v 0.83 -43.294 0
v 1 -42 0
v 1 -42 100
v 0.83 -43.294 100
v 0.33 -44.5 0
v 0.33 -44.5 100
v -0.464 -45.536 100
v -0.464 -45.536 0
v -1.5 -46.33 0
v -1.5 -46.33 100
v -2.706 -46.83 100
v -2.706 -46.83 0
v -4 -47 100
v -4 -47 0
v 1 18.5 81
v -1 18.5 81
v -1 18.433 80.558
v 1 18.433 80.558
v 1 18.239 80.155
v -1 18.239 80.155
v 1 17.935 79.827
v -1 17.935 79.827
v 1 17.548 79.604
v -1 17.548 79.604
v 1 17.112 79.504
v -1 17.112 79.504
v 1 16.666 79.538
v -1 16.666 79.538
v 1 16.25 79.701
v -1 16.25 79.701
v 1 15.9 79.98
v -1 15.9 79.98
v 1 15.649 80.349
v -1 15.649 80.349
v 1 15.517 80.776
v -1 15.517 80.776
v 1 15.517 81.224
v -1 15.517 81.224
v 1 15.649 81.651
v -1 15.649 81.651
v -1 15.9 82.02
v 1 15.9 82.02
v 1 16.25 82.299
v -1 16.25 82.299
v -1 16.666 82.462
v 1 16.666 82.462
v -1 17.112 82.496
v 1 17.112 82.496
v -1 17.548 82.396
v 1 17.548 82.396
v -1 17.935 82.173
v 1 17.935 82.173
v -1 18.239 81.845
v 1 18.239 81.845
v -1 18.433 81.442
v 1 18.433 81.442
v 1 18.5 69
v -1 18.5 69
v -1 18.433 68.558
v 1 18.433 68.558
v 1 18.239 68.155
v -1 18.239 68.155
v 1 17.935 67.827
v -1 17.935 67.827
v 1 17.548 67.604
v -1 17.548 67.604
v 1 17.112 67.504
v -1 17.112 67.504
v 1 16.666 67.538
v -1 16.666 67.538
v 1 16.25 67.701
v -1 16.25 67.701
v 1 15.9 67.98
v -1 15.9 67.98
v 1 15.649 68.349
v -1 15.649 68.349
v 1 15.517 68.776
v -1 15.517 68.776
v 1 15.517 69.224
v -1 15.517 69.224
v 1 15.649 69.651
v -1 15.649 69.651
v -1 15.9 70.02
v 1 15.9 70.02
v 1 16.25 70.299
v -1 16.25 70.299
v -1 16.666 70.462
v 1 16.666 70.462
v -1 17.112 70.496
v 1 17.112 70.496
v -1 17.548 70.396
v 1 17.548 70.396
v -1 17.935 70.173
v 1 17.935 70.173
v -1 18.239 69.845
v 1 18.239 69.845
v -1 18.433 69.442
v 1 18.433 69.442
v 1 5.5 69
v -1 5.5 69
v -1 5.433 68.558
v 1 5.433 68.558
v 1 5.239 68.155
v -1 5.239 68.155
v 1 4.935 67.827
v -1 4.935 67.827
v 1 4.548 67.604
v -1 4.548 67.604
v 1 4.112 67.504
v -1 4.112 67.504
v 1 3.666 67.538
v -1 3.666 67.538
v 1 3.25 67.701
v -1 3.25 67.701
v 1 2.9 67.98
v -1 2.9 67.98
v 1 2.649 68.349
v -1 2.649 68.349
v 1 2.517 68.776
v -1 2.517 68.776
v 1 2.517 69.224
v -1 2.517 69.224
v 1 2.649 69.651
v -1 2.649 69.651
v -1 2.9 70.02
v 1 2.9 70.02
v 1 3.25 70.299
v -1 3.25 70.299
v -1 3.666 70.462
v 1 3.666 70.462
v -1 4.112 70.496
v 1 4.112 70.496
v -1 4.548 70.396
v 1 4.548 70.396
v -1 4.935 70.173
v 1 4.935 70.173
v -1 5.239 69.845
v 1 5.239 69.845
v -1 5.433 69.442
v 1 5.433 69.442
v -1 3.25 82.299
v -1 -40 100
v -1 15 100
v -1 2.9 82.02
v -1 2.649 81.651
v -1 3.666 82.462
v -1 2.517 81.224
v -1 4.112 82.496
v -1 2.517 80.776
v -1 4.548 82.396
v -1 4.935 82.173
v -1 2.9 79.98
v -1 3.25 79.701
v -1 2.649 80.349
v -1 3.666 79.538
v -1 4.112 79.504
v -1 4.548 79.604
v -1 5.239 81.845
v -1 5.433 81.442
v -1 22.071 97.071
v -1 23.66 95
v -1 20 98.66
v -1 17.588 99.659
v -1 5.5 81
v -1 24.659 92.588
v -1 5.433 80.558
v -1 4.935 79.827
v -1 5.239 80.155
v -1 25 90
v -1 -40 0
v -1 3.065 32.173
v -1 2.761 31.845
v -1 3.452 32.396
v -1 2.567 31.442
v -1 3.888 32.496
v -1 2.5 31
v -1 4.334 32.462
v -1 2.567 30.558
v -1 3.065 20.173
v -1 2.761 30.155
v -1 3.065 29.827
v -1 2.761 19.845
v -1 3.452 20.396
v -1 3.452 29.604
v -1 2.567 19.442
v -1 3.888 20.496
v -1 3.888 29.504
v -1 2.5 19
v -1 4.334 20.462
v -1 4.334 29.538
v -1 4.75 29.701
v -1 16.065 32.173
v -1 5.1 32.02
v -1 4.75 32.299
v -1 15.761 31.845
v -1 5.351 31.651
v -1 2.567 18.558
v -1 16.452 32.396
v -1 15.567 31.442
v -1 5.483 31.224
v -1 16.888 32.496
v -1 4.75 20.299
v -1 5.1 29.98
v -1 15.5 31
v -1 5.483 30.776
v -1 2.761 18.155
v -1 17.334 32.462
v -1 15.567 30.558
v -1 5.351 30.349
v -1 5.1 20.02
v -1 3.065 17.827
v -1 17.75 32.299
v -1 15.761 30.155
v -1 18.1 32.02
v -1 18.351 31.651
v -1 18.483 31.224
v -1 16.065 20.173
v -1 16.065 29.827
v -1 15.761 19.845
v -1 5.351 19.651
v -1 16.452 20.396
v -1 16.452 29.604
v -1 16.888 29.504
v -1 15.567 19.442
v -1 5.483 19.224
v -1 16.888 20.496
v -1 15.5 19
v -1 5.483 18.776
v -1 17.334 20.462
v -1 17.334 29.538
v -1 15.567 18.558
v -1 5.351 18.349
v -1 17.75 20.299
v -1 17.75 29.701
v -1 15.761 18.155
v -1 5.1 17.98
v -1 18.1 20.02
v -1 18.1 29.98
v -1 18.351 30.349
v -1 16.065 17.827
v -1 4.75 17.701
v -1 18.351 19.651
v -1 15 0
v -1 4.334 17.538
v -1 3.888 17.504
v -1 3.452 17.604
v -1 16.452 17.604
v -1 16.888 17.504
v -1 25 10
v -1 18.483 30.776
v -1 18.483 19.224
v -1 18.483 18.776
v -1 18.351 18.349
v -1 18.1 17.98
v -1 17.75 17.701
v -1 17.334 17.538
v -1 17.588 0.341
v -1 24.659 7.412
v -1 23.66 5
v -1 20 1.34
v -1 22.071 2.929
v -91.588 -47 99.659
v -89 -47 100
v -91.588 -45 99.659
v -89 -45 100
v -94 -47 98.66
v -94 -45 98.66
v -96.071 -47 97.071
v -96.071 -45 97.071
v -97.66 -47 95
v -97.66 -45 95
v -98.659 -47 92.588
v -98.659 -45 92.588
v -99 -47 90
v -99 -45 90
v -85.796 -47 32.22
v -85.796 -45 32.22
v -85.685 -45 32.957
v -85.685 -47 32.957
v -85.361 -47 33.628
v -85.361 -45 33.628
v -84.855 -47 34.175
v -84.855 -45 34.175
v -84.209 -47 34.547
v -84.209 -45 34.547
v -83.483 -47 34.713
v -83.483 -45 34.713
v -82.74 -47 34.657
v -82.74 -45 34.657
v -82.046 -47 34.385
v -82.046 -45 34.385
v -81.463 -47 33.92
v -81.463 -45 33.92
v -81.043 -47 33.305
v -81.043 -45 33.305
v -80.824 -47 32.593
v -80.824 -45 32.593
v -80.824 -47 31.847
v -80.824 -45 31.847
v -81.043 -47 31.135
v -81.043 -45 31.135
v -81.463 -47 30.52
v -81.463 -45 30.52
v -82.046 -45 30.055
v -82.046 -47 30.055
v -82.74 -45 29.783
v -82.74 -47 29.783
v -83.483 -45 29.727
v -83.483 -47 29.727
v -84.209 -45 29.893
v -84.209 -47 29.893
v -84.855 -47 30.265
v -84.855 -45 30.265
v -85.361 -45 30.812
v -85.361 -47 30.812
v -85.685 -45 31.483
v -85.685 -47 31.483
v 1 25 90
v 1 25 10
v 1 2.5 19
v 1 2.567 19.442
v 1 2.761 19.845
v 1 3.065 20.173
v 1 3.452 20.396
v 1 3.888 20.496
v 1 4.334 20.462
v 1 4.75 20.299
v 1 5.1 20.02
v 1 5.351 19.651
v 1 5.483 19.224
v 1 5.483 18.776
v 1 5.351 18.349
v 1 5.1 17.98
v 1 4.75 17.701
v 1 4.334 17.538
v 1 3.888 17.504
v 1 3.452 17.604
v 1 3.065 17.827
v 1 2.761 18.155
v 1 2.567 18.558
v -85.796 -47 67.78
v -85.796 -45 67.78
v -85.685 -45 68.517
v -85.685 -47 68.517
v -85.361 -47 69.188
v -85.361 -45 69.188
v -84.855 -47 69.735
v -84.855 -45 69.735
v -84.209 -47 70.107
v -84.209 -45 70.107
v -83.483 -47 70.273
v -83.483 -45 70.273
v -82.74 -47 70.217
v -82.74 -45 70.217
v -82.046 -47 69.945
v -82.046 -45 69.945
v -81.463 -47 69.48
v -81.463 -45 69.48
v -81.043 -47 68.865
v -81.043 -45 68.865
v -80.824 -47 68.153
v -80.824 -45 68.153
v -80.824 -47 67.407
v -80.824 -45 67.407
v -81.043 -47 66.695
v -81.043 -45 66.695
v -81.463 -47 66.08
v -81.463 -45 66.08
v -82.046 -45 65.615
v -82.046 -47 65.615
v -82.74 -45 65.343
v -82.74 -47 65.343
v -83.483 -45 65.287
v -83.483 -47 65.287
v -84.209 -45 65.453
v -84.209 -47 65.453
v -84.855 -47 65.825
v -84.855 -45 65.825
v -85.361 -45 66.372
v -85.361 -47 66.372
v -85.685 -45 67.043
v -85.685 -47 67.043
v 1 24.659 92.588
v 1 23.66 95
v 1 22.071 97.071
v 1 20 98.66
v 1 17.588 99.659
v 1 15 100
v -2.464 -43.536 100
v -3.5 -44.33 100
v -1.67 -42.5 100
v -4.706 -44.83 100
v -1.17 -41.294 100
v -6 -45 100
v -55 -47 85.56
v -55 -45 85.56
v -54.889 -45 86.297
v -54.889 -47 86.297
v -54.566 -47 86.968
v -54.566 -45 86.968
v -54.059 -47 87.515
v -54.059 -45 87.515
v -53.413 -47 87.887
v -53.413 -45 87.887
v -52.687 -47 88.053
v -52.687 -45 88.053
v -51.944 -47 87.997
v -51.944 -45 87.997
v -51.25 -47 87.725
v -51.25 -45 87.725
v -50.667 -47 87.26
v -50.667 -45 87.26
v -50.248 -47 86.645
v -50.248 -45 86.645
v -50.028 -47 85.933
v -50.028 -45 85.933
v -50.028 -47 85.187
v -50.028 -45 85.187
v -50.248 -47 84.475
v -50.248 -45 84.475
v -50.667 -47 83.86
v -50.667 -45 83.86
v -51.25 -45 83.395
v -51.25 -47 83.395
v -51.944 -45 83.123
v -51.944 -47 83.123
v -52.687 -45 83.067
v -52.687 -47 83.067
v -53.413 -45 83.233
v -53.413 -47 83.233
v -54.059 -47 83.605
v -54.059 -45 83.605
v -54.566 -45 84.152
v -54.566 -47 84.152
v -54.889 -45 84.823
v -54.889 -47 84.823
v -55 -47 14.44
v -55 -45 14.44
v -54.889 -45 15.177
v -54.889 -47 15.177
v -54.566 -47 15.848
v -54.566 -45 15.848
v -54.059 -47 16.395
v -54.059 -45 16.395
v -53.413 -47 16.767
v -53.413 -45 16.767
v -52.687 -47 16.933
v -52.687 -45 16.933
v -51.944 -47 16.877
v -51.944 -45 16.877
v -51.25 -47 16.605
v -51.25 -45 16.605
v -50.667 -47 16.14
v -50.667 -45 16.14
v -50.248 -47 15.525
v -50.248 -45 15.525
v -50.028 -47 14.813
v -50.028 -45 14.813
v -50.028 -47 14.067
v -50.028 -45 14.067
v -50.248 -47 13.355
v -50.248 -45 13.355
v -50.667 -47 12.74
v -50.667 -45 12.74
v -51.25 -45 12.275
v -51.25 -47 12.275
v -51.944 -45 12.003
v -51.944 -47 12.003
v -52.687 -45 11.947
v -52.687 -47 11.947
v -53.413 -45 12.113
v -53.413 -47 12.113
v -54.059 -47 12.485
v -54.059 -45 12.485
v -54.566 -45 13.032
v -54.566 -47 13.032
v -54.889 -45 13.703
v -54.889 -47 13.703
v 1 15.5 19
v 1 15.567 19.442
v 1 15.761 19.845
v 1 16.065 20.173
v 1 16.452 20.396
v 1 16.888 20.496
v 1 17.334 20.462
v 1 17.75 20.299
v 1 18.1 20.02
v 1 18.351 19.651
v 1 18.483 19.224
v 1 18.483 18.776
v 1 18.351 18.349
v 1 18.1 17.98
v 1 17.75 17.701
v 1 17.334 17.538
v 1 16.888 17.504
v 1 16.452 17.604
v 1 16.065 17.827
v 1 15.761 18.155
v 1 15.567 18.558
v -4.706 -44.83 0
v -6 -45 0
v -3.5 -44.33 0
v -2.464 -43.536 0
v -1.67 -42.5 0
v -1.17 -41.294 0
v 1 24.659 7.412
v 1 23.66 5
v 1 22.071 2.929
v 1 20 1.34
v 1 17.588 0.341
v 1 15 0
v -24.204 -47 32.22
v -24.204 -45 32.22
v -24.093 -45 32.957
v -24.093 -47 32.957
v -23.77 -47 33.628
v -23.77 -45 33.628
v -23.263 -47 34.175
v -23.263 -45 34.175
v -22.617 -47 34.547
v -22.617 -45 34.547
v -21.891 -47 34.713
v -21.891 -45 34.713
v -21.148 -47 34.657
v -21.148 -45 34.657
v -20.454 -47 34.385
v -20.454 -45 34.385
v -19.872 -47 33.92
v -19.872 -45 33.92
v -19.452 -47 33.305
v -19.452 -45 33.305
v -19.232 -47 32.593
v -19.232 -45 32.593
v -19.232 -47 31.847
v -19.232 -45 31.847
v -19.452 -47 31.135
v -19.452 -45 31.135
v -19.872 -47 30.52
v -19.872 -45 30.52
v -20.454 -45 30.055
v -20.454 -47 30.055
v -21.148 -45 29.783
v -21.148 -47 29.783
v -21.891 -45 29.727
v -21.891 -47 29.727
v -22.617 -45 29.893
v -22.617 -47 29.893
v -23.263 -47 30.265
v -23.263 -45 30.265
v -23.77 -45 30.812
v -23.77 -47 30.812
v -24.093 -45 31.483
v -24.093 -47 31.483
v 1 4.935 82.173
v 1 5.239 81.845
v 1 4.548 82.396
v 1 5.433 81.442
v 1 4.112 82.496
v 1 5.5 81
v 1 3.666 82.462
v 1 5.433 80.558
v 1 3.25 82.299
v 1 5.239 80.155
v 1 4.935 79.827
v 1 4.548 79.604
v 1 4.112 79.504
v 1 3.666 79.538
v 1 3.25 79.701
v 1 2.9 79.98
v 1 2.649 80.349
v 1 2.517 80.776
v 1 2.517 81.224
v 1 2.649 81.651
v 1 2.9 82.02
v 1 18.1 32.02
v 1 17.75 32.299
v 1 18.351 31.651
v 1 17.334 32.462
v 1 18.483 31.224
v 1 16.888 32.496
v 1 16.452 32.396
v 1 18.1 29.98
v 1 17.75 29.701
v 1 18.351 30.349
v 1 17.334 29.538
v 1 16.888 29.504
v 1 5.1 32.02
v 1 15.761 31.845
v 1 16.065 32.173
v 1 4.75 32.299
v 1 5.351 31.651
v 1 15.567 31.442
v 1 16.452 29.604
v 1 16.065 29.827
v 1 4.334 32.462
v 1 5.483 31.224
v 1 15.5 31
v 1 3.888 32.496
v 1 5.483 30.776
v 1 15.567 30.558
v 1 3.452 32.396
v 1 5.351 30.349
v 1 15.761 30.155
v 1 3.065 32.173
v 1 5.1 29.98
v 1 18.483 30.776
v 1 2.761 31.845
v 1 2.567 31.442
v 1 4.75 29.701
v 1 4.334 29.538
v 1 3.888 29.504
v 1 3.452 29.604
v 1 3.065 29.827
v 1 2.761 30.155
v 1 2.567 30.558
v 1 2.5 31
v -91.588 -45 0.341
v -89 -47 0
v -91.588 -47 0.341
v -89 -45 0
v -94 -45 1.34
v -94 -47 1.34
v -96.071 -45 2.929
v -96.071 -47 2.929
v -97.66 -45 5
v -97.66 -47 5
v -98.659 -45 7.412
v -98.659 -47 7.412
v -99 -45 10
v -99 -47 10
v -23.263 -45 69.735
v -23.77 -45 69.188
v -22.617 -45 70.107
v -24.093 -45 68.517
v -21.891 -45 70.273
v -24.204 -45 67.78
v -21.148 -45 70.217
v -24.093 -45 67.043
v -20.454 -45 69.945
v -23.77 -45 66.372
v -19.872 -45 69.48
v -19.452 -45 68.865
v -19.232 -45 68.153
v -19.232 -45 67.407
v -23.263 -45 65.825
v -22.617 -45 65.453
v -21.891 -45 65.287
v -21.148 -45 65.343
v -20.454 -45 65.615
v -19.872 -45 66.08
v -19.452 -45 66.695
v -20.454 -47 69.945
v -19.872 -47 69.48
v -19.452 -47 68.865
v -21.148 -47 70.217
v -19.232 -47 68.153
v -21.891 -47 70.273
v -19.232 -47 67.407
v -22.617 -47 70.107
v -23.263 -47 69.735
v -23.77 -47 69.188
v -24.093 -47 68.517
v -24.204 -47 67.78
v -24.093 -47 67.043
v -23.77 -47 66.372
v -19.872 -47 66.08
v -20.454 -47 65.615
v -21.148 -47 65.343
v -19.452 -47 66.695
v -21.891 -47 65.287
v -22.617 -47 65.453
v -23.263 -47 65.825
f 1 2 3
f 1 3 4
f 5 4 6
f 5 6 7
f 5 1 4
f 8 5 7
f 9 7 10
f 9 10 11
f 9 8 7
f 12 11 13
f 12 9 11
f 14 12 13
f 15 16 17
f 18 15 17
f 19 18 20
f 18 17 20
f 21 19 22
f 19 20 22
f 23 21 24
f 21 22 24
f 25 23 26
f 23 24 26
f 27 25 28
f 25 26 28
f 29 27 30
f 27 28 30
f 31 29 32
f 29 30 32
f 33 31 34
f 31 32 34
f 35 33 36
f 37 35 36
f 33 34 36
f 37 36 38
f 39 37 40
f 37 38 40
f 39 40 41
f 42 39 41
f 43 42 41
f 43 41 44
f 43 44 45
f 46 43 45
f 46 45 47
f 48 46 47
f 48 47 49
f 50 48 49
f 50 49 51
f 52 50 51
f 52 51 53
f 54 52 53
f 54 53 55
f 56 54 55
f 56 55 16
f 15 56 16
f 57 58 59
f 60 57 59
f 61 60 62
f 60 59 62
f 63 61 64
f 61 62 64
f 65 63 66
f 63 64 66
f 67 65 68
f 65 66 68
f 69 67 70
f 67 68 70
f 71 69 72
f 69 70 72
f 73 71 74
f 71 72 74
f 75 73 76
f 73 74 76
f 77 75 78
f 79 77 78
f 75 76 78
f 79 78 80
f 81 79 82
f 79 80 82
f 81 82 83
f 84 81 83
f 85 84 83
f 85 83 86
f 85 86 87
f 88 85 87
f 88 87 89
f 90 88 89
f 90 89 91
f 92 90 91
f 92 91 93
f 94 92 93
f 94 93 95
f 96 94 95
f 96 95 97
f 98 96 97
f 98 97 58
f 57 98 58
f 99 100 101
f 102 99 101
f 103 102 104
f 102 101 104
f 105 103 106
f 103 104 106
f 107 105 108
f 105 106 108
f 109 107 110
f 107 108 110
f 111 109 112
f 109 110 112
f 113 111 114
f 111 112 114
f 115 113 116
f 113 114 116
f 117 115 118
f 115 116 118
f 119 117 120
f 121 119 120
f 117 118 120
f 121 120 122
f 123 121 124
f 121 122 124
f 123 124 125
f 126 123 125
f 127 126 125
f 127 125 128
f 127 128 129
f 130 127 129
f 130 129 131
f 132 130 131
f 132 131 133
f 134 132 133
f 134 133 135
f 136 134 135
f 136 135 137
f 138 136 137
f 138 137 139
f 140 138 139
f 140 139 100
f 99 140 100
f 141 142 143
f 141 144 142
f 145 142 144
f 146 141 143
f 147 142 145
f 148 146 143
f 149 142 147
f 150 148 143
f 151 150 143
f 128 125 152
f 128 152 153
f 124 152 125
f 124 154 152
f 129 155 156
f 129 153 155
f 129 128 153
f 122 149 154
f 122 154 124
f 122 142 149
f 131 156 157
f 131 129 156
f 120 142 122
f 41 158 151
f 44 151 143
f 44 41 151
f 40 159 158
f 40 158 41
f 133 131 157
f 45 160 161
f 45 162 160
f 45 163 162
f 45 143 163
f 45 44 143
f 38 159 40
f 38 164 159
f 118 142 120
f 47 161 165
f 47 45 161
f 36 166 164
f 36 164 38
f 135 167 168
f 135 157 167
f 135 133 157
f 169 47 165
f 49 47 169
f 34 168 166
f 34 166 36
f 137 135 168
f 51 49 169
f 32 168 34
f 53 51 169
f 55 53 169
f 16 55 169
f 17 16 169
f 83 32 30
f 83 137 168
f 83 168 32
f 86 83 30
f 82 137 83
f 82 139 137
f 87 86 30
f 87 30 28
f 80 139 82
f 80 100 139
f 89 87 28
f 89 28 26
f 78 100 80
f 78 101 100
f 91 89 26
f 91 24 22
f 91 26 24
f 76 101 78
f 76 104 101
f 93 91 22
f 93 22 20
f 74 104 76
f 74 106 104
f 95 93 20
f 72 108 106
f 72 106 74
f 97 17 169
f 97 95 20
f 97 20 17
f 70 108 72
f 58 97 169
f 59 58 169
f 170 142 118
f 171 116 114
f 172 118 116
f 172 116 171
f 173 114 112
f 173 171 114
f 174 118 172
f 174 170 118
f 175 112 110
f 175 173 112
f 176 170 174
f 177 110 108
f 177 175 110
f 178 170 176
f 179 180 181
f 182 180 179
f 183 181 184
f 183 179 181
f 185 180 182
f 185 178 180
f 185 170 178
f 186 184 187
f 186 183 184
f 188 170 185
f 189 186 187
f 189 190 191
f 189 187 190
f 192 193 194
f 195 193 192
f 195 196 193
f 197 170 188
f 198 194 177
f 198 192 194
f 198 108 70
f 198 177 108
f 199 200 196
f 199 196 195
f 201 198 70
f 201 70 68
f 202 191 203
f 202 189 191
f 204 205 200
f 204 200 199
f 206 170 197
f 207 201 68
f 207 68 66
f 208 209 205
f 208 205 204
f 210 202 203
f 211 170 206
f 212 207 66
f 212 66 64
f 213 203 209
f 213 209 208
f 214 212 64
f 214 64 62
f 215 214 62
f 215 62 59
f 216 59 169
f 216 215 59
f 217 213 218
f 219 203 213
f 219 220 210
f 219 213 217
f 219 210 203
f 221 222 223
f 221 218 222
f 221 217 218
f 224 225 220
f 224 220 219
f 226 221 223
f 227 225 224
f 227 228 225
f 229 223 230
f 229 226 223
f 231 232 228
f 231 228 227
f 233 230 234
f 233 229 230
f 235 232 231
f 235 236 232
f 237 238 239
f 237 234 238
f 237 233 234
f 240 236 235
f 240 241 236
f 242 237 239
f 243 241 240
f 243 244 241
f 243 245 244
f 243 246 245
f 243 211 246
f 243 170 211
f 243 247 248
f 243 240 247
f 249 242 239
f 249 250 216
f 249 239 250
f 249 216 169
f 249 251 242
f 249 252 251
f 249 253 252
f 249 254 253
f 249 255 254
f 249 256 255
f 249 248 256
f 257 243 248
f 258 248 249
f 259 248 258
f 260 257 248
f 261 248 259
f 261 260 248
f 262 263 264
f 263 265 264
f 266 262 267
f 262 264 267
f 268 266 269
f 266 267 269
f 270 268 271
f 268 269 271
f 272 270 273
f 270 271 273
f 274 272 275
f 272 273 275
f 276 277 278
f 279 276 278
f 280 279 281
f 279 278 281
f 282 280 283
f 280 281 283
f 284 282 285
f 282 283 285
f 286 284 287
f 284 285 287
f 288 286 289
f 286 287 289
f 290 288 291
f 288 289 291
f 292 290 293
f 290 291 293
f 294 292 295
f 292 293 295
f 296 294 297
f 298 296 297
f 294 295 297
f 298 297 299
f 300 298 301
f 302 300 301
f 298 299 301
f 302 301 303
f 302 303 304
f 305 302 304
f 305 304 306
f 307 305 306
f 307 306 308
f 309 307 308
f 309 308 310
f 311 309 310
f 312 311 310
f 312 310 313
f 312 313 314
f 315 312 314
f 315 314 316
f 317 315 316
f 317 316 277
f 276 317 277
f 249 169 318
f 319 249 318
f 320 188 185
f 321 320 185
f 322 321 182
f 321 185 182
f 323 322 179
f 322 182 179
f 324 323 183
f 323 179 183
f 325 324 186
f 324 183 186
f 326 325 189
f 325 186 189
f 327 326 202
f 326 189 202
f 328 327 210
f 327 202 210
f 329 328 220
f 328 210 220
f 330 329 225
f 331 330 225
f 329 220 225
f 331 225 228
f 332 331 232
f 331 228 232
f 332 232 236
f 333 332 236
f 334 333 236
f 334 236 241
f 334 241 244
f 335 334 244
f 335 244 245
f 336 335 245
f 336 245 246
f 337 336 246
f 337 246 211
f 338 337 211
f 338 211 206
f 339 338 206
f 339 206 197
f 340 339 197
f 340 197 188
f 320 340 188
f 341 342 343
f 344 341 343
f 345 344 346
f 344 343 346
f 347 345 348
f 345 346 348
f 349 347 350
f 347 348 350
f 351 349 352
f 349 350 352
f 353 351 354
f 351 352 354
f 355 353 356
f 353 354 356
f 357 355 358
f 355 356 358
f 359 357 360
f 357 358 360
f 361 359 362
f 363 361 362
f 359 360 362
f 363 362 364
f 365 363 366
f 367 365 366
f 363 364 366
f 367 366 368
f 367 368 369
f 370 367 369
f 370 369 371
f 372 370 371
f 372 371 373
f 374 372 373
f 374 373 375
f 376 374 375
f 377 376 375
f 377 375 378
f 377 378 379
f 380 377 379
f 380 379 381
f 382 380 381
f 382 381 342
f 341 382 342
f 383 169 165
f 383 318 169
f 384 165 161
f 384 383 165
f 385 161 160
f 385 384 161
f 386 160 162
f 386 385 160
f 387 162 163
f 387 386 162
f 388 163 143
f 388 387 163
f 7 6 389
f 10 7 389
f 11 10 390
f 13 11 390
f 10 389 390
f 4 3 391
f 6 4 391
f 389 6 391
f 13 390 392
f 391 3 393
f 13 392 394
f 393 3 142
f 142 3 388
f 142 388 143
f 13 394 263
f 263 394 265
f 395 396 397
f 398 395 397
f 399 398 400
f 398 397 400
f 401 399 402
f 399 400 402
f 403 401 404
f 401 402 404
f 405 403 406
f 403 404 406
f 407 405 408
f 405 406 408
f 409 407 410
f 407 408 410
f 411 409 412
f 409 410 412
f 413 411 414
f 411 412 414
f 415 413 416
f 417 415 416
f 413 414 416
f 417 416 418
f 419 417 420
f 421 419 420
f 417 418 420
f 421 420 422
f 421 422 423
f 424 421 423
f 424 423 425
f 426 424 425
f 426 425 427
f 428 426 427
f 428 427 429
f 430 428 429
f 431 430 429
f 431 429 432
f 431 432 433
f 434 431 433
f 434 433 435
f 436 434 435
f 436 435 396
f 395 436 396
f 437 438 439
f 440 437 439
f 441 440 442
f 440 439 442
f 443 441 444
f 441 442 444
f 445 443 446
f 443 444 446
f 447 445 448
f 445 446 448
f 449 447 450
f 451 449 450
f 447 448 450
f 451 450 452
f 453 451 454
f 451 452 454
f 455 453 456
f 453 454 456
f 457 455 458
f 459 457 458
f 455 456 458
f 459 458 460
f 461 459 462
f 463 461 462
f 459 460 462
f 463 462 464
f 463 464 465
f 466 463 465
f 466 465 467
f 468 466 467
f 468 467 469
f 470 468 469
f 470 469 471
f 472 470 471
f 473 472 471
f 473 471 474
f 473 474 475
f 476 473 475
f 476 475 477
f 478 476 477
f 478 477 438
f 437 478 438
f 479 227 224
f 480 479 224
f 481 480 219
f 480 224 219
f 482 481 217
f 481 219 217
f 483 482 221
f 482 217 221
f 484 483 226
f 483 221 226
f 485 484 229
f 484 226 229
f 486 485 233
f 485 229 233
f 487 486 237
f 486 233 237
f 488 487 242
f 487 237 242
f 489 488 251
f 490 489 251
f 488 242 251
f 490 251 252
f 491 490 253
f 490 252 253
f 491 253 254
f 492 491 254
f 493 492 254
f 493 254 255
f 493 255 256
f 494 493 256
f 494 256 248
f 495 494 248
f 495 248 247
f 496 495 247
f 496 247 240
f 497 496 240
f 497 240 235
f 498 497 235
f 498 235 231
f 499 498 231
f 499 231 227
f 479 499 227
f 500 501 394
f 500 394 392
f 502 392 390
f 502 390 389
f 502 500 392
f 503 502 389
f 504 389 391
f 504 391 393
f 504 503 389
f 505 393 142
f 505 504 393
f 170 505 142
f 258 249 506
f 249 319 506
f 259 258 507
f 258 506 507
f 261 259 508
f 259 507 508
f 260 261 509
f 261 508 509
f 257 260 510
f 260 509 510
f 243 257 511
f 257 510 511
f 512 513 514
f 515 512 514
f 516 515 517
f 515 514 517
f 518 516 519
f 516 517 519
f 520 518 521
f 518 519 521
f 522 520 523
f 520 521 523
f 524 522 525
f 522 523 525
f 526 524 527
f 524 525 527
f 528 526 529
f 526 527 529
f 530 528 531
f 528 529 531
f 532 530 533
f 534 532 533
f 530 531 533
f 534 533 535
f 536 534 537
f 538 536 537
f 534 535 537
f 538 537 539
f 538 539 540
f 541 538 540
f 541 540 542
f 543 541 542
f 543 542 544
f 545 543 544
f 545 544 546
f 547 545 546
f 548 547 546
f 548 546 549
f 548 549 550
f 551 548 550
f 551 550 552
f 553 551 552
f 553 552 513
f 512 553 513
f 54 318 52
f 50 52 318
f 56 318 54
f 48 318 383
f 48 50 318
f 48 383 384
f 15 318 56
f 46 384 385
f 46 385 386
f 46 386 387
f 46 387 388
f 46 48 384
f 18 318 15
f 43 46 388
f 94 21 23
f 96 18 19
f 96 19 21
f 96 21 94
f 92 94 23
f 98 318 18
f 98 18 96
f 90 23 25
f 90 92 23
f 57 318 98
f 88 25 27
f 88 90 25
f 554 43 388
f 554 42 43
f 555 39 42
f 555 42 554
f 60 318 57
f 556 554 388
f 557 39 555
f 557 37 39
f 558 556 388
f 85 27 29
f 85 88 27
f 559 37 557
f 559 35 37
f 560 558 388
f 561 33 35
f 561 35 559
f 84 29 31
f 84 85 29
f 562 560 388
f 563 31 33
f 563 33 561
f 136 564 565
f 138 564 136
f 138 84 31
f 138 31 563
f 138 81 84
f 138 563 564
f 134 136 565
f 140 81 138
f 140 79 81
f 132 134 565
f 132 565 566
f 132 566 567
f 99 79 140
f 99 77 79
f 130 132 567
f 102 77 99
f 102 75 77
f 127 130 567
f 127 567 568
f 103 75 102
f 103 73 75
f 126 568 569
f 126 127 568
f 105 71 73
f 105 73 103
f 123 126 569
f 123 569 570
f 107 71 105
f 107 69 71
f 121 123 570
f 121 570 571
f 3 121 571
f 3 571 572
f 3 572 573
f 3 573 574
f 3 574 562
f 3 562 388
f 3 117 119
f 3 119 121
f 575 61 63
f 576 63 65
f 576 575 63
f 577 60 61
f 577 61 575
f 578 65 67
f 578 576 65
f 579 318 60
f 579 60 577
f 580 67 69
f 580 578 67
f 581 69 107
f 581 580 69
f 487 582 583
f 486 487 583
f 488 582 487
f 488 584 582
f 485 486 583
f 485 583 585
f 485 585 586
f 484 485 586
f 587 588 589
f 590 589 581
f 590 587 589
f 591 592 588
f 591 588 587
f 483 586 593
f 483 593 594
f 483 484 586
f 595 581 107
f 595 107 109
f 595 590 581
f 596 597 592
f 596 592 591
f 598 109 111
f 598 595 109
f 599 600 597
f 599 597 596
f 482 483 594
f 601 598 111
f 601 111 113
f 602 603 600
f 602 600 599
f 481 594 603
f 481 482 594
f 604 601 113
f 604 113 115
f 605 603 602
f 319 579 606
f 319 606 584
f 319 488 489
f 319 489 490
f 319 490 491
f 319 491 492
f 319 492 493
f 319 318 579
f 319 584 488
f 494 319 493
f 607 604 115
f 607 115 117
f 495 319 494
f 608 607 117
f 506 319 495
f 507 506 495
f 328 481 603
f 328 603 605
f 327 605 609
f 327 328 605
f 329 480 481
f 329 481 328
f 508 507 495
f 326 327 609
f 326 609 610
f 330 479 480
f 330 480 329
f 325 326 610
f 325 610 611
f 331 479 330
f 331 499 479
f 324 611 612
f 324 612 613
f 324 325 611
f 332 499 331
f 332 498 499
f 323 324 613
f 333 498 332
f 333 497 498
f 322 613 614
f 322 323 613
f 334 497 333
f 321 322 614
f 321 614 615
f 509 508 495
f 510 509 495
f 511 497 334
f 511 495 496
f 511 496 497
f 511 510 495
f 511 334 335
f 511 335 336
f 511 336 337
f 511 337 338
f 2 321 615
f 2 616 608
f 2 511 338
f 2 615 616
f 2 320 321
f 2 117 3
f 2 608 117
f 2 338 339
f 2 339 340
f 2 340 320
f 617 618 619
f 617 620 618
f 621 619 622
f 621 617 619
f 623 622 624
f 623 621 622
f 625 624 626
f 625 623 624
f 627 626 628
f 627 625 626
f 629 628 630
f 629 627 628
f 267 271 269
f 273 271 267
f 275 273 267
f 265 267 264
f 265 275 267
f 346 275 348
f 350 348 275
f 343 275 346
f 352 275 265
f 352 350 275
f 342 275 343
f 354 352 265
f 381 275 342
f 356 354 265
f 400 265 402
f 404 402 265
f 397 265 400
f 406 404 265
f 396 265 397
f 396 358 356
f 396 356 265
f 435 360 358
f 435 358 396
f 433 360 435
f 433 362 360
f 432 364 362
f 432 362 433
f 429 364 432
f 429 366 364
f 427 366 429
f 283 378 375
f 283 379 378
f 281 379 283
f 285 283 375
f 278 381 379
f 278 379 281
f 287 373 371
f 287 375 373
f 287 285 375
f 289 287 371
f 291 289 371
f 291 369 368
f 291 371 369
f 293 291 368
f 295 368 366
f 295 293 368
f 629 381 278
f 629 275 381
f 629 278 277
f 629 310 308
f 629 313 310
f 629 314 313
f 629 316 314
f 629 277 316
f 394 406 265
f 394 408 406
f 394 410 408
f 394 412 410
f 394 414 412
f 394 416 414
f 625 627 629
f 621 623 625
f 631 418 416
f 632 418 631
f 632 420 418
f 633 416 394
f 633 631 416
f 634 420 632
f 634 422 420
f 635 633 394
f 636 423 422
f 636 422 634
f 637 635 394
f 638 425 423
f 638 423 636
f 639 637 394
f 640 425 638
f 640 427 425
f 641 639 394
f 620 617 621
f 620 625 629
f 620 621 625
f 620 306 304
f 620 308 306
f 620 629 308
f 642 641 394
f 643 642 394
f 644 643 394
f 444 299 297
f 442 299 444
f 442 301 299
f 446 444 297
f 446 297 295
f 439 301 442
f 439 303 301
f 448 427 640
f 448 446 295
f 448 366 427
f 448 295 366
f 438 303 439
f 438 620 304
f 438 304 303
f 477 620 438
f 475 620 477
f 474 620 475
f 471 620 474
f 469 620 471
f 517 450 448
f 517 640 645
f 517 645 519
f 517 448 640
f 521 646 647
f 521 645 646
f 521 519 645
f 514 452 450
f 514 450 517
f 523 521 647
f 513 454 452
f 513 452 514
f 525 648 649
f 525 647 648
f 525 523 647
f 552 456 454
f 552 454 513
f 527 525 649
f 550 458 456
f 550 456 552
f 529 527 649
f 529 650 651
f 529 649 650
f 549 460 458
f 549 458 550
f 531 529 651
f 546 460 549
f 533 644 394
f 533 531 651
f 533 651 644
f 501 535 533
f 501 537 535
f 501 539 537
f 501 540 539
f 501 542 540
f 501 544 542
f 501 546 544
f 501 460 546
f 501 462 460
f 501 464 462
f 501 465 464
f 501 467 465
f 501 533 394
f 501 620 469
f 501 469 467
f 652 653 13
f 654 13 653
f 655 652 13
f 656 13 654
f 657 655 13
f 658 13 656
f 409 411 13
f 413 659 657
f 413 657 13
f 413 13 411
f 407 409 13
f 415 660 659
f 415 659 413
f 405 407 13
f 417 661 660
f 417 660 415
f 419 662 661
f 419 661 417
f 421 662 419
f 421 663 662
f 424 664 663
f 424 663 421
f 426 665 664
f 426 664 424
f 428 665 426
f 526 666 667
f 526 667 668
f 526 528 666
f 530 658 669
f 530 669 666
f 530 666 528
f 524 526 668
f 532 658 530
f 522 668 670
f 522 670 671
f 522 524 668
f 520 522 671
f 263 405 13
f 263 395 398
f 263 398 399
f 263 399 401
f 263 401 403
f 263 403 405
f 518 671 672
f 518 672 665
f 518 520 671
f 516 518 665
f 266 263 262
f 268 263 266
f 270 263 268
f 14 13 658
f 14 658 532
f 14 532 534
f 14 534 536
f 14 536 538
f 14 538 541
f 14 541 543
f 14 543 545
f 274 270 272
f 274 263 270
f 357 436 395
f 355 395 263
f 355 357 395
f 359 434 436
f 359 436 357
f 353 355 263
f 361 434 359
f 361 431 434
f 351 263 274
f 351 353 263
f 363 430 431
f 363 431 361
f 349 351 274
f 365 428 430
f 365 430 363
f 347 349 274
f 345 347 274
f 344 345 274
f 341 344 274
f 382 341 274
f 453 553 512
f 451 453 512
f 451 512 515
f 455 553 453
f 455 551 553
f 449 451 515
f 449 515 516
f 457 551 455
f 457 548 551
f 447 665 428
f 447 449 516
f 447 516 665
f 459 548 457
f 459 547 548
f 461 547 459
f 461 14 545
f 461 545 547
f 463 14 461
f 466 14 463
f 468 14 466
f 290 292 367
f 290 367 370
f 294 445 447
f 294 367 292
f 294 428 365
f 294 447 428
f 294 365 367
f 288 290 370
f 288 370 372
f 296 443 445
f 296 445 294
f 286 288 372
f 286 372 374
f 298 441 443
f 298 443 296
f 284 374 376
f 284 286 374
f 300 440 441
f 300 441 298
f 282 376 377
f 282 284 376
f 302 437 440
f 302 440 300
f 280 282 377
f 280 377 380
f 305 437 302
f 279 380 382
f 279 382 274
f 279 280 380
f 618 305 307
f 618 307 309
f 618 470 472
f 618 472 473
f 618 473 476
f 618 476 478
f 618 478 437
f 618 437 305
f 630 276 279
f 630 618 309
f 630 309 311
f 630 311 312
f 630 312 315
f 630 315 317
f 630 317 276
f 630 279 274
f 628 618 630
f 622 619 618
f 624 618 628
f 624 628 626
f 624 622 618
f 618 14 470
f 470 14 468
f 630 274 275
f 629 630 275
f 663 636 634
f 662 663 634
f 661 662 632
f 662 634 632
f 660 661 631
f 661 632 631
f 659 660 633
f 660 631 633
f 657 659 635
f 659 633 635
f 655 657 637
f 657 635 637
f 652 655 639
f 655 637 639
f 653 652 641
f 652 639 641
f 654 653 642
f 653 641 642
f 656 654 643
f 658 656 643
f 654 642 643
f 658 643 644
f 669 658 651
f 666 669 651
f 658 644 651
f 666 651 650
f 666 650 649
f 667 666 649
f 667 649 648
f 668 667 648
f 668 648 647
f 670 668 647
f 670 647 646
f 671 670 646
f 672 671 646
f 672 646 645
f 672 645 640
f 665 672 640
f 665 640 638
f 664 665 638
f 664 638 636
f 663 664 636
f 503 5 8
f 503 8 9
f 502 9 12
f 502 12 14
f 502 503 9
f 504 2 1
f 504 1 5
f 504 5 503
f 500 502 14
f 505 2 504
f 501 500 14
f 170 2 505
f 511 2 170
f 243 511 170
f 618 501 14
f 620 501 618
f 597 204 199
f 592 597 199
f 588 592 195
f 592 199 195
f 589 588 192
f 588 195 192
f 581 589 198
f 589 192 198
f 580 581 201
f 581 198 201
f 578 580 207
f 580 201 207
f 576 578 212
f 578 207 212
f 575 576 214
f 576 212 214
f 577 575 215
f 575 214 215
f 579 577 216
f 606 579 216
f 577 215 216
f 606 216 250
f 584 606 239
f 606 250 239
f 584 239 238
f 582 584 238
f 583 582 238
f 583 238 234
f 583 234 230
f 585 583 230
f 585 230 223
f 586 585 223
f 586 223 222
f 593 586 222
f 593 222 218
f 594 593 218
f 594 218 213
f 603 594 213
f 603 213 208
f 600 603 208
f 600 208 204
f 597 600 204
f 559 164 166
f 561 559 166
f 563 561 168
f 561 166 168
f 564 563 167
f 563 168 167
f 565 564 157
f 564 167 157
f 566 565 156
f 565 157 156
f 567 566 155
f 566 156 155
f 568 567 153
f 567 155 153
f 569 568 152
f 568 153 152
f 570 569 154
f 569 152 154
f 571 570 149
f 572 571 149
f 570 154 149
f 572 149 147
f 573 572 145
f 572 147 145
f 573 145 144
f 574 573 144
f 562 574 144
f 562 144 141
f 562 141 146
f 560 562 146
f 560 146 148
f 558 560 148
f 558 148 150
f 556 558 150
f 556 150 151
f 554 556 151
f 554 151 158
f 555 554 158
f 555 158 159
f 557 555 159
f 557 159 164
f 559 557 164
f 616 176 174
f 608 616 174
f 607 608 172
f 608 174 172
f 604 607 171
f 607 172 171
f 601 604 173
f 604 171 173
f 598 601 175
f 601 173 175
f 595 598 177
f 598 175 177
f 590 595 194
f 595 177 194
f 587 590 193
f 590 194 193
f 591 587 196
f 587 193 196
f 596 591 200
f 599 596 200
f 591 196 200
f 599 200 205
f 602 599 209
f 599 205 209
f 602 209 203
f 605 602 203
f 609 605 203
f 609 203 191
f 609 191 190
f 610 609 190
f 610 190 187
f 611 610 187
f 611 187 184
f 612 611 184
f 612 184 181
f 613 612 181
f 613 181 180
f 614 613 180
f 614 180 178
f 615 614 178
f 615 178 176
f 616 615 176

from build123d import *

# Parameters (mm, degrees)
BOSS_EXTRUDE1_DEPTH = 100
SKETCH2_R           = 1.5
CUT_EXTRUDE1_DEPTH  = 148.692247596
SKETCH3_R           = 2.5
CUT_EXTRUDE2_DEPTH  = 158.165517847
FILLET1_R           = 10


with BuildPart() as part:
    # Sketch1 → Boss-Extrude1 (new body)
    with BuildSketch(Plane.XY):
        with BuildLine():
            Line((-1, 25), (1, 25))
            Line((1, 25), (1, -42))
            ThreePointArc((1, -42), (-0.464466094, -45.535533906), (-4, -47))
            Line((-4, -47), (-99, -47))
            Line((-99, -47), (-99, -45))
            Line((-99, -45), (-6, -45))
            ThreePointArc((-6, -45), (-2.464466094, -43.535533906), (-1, -40))
            Line((-1, -40), (-1, 25))
        make_face()
    extrude(amount=BOSS_EXTRUDE1_DEPTH)

    # Sketch2 → Cut-Extrude1 (cut, through all)
    with BuildSketch(Plane.ZY.offset(1)):
        with Locations(Location((19, 4, 0), (0, 0, 270))):
            Circle(SKETCH2_R)
        with Locations(Location((31, 4, 0), (0, 0, 270))):
            Circle(SKETCH2_R)
        with Locations(Location((31, 17, 0), (0, 0, 270))):
            Circle(SKETCH2_R)
        with Locations(Location((19, 17, 0), (0, 0, 270))):
            Circle(SKETCH2_R)
        with Locations(Location((81, 17, 0), (0, 0, 90))):
            Circle(SKETCH2_R)
        with Locations(Location((69, 17, 0), (0, 0, 90))):
            Circle(SKETCH2_R)
        with Locations(Location((69, 4, 0), (0, 0, 90))):
            Circle(SKETCH2_R)
        with Locations(Location((81, 4, 0), (0, 0, 90))):
            Circle(SKETCH2_R)
    extrude(amount=-CUT_EXTRUDE1_DEPTH, mode=Mode.SUBTRACT)

    # Sketch3 → Cut-Extrude2 (cut, through all)
    with BuildSketch(Plane(origin=(0, -45, 0), x_dir=(1, 0, 0), z_dir=(0, 1, 0))):
        with Locations(Location((-21.704136641, -32.22, 0), (0, 0, 180))):
            Circle(SKETCH3_R)
        with Locations(Location((-21.704136641, -67.78, 0), (0, 0, 180))):
            Circle(SKETCH3_R)
        with Locations(Location((-52.5, -85.56, 0), (0, 0, 180))):
            Circle(SKETCH3_R)
        with Locations(Location((-83.295863359, -67.78, 0), (0, 0, 180))):
            Circle(SKETCH3_R)
        with Locations(Location((-83.295863359, -32.22, 0), (0, 0, 180))):
            Circle(SKETCH3_R)
        with Locations(Location((-52.5, -14.44, 0), (0, 0, 180))):
            Circle(SKETCH3_R)
    extrude(amount=-CUT_EXTRUDE2_DEPTH, mode=Mode.SUBTRACT)

    # Fillet1
    fillet1_edges = [part.edges().sort_by_distance(p)[0] for p in [
        (-99, -46, 0),
        (-99, -46, 100),
        (0, 25, 100),
        (0, 25, 0),
    ]]
    fillet(fillet1_edges, radius=FILLET1_R)


solid = part.part
